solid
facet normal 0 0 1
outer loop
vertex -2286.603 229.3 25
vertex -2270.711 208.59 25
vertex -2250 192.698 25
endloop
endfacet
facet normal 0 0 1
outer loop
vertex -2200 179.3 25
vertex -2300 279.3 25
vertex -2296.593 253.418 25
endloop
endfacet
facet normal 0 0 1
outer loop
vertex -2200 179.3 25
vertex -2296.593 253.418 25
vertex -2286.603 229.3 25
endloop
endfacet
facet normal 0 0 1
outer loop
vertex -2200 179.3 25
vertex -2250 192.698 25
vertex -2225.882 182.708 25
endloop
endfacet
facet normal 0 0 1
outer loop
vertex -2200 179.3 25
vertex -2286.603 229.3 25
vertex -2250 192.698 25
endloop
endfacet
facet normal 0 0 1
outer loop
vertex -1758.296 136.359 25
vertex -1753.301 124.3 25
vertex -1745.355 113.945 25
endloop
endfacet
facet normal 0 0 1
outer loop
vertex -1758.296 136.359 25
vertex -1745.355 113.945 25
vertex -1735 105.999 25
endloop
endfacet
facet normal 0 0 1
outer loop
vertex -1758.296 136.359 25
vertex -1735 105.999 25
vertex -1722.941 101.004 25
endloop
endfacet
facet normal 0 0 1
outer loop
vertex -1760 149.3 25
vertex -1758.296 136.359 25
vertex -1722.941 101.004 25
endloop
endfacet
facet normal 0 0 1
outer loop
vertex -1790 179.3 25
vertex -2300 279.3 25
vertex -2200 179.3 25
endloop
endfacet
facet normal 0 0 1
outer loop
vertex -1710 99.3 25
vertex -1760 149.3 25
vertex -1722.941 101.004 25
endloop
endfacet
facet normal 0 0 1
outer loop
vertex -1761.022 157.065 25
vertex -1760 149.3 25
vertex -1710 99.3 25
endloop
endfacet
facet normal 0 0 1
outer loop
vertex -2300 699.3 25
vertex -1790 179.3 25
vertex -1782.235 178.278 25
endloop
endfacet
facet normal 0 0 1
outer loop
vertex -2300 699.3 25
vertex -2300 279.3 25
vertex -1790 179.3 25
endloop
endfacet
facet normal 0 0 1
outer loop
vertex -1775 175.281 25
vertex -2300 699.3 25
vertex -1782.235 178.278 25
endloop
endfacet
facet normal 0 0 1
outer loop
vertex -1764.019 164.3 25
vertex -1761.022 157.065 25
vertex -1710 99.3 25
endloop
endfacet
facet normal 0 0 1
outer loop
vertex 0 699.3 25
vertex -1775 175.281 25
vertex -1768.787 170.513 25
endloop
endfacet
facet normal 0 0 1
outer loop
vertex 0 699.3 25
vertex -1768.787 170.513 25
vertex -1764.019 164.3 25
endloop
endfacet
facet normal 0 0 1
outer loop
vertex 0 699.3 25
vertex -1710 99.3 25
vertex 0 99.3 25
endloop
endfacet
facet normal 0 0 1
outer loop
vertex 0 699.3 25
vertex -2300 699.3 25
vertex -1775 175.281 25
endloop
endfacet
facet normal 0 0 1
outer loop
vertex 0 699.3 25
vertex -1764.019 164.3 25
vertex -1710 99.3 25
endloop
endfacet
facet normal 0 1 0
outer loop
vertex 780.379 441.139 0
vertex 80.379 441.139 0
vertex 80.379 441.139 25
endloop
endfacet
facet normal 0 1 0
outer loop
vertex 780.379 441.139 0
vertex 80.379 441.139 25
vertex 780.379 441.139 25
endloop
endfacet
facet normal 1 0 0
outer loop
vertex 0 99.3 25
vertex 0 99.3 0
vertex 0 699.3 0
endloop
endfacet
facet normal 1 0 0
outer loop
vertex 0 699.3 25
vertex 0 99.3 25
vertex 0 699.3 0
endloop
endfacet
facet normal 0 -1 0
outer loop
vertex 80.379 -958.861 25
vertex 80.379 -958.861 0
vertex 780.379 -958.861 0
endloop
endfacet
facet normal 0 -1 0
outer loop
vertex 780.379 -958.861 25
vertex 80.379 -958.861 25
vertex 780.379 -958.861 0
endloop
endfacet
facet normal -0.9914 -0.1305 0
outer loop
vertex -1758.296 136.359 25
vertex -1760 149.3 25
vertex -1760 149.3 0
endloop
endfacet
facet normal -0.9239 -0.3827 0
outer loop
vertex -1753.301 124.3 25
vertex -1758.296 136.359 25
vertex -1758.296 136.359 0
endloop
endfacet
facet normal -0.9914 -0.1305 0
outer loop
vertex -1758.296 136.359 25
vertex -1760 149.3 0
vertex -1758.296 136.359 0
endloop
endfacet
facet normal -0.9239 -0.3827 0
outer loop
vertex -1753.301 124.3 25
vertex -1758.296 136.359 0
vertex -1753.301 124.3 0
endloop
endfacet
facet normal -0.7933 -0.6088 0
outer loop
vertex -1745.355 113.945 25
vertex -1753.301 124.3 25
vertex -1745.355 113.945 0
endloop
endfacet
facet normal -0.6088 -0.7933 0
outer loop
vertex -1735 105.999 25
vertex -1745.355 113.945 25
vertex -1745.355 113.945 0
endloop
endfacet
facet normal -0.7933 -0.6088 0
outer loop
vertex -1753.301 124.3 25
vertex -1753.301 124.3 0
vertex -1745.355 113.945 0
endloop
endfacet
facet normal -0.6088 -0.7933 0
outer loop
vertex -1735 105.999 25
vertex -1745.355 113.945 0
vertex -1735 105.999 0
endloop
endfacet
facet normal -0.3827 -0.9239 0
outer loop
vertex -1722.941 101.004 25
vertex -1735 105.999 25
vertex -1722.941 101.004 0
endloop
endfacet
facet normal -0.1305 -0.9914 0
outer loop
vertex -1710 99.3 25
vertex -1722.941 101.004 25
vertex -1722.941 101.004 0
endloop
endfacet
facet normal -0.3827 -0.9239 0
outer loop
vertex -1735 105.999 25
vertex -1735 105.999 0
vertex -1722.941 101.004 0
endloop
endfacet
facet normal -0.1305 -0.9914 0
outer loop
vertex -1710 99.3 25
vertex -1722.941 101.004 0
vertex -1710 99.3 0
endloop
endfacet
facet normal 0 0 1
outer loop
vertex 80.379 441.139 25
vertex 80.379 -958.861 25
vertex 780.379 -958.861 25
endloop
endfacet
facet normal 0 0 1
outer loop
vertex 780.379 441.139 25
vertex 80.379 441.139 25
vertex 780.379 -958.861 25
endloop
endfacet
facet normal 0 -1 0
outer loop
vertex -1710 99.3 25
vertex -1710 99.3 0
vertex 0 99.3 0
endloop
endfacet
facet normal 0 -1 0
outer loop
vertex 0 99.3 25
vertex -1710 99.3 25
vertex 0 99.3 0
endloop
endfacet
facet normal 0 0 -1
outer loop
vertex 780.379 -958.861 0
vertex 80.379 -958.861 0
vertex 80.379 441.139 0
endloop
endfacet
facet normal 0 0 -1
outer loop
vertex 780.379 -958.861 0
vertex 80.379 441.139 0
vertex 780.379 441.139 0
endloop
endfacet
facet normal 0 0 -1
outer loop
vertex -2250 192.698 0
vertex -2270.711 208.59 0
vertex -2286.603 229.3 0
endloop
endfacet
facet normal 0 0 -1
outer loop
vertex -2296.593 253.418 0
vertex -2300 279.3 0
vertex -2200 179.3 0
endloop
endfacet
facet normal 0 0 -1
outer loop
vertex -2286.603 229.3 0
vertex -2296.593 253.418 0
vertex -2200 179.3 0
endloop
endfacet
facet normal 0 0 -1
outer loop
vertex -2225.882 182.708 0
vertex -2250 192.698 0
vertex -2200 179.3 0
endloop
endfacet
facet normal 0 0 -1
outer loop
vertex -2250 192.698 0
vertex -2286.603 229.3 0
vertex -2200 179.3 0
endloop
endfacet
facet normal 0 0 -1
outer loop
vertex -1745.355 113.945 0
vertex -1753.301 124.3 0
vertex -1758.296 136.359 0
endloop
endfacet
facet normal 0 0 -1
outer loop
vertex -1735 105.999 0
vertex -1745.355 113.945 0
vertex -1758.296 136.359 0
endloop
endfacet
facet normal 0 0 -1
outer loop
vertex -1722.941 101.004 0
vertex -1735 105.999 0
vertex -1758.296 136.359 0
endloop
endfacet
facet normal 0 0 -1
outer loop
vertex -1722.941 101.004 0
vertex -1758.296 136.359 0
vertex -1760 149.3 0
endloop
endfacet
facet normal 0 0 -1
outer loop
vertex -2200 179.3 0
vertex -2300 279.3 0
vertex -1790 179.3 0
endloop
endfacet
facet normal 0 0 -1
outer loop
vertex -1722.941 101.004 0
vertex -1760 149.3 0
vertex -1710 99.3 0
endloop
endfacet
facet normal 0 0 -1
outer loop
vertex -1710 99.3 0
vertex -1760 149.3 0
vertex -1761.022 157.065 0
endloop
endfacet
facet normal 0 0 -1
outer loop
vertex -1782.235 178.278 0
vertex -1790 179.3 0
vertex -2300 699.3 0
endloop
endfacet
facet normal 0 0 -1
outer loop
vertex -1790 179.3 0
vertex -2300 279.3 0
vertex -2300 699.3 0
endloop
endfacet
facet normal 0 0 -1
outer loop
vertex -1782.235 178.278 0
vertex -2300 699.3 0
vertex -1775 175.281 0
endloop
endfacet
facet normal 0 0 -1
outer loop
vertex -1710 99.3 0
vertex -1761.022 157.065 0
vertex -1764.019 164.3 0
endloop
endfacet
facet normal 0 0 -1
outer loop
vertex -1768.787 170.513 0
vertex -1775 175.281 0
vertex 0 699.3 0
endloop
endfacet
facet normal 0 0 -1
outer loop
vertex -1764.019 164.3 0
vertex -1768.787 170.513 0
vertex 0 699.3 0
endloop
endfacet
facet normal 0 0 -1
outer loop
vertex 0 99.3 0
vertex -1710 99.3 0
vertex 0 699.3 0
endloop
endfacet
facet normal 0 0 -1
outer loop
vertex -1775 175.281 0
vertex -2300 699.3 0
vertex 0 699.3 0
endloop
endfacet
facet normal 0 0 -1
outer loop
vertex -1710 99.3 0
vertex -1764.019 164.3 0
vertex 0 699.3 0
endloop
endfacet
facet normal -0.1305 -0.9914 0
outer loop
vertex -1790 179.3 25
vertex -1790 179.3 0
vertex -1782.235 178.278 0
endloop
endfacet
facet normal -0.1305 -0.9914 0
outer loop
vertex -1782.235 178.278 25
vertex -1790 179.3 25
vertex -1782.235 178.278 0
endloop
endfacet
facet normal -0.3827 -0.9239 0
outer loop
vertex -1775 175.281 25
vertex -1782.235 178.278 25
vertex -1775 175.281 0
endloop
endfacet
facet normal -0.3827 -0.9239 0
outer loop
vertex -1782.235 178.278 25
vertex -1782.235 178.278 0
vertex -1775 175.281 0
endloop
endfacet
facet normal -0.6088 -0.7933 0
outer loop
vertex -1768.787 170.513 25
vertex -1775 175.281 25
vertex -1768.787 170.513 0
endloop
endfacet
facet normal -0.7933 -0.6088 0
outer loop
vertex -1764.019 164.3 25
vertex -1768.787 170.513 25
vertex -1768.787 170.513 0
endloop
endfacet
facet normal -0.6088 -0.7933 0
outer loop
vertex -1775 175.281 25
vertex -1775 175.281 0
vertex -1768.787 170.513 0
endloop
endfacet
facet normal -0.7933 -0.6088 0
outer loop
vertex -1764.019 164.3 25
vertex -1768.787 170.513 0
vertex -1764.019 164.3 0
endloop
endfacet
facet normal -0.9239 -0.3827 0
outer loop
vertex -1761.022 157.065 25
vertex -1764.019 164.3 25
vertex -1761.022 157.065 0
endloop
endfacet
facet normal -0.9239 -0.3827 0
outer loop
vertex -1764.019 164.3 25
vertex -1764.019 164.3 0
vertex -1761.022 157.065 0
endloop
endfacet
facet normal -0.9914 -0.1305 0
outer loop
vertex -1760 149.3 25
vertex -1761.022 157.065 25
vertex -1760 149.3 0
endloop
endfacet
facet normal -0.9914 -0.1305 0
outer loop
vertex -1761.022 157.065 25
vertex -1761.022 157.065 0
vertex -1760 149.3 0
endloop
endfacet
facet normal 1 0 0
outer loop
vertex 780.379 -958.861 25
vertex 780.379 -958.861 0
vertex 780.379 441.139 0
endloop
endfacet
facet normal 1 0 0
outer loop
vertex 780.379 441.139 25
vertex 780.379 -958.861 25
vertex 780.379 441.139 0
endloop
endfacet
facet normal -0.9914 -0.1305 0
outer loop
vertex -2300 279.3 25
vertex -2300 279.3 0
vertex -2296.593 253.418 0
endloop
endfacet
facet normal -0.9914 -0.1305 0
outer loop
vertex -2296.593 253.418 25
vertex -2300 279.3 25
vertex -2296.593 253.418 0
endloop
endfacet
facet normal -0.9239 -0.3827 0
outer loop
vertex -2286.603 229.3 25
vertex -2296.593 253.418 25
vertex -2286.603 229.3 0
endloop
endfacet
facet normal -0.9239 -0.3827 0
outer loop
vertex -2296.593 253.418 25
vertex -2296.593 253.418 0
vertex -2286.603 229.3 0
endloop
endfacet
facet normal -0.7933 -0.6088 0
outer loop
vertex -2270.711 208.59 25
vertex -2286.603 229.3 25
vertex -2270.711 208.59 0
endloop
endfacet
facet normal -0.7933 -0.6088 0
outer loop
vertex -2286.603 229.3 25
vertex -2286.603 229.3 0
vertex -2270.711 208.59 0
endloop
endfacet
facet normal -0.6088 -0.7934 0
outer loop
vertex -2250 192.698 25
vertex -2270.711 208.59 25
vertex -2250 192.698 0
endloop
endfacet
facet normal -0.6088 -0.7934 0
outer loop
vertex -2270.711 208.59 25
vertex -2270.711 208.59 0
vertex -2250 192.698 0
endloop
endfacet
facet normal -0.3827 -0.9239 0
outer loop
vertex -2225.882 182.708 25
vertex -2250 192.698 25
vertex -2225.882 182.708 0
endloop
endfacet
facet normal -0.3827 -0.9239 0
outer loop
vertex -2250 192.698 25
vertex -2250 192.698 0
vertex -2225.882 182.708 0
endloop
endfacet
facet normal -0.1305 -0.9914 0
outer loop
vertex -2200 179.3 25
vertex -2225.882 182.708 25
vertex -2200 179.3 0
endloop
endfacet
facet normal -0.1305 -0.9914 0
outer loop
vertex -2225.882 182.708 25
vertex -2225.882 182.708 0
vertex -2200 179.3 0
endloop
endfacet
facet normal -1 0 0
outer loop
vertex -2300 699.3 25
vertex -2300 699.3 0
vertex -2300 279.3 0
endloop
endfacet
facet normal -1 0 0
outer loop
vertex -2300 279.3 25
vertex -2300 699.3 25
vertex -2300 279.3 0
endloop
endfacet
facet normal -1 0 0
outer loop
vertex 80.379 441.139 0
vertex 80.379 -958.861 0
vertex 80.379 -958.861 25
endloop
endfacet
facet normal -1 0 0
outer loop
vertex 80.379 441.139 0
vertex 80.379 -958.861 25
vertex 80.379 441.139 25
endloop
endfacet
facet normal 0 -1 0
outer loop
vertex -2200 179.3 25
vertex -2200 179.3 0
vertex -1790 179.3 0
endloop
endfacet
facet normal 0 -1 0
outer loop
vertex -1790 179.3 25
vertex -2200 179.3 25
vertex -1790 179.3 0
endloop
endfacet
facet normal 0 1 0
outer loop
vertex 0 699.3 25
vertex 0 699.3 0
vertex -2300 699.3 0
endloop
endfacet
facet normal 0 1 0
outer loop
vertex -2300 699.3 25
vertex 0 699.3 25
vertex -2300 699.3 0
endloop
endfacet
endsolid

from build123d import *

# Parameters (mm, degrees)
F2_DEPTH = 25
F1_W     = 700
F1_H     = 1400
F3_DEPTH = 25


with BuildPart() as f2:
    # F0 (on Top) → F2 (new body)
    with BuildSketch(Plane.XY):
        with BuildLine():
            Line((0, 699.300214), (-2300, 699.300214))
            Line((-2300, 699.300214), (-2300, 279.300214))
            ThreePointArc((-2300, 279.300214), (-2270.710678, 208.589536), (-2200, 179.300214))
            Line((-2200, 179.300214), (-1790, 179.300214))
            ThreePointArc((-1790, 179.300214), (-1768.786797, 170.513418), (-1760, 149.300214))
            ThreePointArc((-1760, 149.300214), (-1745.355339, 113.944875), (-1710, 99.300214))
            Line((-1710, 99.300214), (0, 99.300214))
            Line((0, 99.300214), (0, 699.300214))
        make_face()
    extrude(amount=F2_DEPTH)


with BuildPart() as f3:
    # F1 (on Top) → F3 (new body)
    with BuildSketch(Plane.XY):
        with Locations((430.379018, -258.861389)):
            Rectangle(F1_W, F1_H)
    extrude(amount=F3_DEPTH)


solid = Compound([f2.part, f3.part])
